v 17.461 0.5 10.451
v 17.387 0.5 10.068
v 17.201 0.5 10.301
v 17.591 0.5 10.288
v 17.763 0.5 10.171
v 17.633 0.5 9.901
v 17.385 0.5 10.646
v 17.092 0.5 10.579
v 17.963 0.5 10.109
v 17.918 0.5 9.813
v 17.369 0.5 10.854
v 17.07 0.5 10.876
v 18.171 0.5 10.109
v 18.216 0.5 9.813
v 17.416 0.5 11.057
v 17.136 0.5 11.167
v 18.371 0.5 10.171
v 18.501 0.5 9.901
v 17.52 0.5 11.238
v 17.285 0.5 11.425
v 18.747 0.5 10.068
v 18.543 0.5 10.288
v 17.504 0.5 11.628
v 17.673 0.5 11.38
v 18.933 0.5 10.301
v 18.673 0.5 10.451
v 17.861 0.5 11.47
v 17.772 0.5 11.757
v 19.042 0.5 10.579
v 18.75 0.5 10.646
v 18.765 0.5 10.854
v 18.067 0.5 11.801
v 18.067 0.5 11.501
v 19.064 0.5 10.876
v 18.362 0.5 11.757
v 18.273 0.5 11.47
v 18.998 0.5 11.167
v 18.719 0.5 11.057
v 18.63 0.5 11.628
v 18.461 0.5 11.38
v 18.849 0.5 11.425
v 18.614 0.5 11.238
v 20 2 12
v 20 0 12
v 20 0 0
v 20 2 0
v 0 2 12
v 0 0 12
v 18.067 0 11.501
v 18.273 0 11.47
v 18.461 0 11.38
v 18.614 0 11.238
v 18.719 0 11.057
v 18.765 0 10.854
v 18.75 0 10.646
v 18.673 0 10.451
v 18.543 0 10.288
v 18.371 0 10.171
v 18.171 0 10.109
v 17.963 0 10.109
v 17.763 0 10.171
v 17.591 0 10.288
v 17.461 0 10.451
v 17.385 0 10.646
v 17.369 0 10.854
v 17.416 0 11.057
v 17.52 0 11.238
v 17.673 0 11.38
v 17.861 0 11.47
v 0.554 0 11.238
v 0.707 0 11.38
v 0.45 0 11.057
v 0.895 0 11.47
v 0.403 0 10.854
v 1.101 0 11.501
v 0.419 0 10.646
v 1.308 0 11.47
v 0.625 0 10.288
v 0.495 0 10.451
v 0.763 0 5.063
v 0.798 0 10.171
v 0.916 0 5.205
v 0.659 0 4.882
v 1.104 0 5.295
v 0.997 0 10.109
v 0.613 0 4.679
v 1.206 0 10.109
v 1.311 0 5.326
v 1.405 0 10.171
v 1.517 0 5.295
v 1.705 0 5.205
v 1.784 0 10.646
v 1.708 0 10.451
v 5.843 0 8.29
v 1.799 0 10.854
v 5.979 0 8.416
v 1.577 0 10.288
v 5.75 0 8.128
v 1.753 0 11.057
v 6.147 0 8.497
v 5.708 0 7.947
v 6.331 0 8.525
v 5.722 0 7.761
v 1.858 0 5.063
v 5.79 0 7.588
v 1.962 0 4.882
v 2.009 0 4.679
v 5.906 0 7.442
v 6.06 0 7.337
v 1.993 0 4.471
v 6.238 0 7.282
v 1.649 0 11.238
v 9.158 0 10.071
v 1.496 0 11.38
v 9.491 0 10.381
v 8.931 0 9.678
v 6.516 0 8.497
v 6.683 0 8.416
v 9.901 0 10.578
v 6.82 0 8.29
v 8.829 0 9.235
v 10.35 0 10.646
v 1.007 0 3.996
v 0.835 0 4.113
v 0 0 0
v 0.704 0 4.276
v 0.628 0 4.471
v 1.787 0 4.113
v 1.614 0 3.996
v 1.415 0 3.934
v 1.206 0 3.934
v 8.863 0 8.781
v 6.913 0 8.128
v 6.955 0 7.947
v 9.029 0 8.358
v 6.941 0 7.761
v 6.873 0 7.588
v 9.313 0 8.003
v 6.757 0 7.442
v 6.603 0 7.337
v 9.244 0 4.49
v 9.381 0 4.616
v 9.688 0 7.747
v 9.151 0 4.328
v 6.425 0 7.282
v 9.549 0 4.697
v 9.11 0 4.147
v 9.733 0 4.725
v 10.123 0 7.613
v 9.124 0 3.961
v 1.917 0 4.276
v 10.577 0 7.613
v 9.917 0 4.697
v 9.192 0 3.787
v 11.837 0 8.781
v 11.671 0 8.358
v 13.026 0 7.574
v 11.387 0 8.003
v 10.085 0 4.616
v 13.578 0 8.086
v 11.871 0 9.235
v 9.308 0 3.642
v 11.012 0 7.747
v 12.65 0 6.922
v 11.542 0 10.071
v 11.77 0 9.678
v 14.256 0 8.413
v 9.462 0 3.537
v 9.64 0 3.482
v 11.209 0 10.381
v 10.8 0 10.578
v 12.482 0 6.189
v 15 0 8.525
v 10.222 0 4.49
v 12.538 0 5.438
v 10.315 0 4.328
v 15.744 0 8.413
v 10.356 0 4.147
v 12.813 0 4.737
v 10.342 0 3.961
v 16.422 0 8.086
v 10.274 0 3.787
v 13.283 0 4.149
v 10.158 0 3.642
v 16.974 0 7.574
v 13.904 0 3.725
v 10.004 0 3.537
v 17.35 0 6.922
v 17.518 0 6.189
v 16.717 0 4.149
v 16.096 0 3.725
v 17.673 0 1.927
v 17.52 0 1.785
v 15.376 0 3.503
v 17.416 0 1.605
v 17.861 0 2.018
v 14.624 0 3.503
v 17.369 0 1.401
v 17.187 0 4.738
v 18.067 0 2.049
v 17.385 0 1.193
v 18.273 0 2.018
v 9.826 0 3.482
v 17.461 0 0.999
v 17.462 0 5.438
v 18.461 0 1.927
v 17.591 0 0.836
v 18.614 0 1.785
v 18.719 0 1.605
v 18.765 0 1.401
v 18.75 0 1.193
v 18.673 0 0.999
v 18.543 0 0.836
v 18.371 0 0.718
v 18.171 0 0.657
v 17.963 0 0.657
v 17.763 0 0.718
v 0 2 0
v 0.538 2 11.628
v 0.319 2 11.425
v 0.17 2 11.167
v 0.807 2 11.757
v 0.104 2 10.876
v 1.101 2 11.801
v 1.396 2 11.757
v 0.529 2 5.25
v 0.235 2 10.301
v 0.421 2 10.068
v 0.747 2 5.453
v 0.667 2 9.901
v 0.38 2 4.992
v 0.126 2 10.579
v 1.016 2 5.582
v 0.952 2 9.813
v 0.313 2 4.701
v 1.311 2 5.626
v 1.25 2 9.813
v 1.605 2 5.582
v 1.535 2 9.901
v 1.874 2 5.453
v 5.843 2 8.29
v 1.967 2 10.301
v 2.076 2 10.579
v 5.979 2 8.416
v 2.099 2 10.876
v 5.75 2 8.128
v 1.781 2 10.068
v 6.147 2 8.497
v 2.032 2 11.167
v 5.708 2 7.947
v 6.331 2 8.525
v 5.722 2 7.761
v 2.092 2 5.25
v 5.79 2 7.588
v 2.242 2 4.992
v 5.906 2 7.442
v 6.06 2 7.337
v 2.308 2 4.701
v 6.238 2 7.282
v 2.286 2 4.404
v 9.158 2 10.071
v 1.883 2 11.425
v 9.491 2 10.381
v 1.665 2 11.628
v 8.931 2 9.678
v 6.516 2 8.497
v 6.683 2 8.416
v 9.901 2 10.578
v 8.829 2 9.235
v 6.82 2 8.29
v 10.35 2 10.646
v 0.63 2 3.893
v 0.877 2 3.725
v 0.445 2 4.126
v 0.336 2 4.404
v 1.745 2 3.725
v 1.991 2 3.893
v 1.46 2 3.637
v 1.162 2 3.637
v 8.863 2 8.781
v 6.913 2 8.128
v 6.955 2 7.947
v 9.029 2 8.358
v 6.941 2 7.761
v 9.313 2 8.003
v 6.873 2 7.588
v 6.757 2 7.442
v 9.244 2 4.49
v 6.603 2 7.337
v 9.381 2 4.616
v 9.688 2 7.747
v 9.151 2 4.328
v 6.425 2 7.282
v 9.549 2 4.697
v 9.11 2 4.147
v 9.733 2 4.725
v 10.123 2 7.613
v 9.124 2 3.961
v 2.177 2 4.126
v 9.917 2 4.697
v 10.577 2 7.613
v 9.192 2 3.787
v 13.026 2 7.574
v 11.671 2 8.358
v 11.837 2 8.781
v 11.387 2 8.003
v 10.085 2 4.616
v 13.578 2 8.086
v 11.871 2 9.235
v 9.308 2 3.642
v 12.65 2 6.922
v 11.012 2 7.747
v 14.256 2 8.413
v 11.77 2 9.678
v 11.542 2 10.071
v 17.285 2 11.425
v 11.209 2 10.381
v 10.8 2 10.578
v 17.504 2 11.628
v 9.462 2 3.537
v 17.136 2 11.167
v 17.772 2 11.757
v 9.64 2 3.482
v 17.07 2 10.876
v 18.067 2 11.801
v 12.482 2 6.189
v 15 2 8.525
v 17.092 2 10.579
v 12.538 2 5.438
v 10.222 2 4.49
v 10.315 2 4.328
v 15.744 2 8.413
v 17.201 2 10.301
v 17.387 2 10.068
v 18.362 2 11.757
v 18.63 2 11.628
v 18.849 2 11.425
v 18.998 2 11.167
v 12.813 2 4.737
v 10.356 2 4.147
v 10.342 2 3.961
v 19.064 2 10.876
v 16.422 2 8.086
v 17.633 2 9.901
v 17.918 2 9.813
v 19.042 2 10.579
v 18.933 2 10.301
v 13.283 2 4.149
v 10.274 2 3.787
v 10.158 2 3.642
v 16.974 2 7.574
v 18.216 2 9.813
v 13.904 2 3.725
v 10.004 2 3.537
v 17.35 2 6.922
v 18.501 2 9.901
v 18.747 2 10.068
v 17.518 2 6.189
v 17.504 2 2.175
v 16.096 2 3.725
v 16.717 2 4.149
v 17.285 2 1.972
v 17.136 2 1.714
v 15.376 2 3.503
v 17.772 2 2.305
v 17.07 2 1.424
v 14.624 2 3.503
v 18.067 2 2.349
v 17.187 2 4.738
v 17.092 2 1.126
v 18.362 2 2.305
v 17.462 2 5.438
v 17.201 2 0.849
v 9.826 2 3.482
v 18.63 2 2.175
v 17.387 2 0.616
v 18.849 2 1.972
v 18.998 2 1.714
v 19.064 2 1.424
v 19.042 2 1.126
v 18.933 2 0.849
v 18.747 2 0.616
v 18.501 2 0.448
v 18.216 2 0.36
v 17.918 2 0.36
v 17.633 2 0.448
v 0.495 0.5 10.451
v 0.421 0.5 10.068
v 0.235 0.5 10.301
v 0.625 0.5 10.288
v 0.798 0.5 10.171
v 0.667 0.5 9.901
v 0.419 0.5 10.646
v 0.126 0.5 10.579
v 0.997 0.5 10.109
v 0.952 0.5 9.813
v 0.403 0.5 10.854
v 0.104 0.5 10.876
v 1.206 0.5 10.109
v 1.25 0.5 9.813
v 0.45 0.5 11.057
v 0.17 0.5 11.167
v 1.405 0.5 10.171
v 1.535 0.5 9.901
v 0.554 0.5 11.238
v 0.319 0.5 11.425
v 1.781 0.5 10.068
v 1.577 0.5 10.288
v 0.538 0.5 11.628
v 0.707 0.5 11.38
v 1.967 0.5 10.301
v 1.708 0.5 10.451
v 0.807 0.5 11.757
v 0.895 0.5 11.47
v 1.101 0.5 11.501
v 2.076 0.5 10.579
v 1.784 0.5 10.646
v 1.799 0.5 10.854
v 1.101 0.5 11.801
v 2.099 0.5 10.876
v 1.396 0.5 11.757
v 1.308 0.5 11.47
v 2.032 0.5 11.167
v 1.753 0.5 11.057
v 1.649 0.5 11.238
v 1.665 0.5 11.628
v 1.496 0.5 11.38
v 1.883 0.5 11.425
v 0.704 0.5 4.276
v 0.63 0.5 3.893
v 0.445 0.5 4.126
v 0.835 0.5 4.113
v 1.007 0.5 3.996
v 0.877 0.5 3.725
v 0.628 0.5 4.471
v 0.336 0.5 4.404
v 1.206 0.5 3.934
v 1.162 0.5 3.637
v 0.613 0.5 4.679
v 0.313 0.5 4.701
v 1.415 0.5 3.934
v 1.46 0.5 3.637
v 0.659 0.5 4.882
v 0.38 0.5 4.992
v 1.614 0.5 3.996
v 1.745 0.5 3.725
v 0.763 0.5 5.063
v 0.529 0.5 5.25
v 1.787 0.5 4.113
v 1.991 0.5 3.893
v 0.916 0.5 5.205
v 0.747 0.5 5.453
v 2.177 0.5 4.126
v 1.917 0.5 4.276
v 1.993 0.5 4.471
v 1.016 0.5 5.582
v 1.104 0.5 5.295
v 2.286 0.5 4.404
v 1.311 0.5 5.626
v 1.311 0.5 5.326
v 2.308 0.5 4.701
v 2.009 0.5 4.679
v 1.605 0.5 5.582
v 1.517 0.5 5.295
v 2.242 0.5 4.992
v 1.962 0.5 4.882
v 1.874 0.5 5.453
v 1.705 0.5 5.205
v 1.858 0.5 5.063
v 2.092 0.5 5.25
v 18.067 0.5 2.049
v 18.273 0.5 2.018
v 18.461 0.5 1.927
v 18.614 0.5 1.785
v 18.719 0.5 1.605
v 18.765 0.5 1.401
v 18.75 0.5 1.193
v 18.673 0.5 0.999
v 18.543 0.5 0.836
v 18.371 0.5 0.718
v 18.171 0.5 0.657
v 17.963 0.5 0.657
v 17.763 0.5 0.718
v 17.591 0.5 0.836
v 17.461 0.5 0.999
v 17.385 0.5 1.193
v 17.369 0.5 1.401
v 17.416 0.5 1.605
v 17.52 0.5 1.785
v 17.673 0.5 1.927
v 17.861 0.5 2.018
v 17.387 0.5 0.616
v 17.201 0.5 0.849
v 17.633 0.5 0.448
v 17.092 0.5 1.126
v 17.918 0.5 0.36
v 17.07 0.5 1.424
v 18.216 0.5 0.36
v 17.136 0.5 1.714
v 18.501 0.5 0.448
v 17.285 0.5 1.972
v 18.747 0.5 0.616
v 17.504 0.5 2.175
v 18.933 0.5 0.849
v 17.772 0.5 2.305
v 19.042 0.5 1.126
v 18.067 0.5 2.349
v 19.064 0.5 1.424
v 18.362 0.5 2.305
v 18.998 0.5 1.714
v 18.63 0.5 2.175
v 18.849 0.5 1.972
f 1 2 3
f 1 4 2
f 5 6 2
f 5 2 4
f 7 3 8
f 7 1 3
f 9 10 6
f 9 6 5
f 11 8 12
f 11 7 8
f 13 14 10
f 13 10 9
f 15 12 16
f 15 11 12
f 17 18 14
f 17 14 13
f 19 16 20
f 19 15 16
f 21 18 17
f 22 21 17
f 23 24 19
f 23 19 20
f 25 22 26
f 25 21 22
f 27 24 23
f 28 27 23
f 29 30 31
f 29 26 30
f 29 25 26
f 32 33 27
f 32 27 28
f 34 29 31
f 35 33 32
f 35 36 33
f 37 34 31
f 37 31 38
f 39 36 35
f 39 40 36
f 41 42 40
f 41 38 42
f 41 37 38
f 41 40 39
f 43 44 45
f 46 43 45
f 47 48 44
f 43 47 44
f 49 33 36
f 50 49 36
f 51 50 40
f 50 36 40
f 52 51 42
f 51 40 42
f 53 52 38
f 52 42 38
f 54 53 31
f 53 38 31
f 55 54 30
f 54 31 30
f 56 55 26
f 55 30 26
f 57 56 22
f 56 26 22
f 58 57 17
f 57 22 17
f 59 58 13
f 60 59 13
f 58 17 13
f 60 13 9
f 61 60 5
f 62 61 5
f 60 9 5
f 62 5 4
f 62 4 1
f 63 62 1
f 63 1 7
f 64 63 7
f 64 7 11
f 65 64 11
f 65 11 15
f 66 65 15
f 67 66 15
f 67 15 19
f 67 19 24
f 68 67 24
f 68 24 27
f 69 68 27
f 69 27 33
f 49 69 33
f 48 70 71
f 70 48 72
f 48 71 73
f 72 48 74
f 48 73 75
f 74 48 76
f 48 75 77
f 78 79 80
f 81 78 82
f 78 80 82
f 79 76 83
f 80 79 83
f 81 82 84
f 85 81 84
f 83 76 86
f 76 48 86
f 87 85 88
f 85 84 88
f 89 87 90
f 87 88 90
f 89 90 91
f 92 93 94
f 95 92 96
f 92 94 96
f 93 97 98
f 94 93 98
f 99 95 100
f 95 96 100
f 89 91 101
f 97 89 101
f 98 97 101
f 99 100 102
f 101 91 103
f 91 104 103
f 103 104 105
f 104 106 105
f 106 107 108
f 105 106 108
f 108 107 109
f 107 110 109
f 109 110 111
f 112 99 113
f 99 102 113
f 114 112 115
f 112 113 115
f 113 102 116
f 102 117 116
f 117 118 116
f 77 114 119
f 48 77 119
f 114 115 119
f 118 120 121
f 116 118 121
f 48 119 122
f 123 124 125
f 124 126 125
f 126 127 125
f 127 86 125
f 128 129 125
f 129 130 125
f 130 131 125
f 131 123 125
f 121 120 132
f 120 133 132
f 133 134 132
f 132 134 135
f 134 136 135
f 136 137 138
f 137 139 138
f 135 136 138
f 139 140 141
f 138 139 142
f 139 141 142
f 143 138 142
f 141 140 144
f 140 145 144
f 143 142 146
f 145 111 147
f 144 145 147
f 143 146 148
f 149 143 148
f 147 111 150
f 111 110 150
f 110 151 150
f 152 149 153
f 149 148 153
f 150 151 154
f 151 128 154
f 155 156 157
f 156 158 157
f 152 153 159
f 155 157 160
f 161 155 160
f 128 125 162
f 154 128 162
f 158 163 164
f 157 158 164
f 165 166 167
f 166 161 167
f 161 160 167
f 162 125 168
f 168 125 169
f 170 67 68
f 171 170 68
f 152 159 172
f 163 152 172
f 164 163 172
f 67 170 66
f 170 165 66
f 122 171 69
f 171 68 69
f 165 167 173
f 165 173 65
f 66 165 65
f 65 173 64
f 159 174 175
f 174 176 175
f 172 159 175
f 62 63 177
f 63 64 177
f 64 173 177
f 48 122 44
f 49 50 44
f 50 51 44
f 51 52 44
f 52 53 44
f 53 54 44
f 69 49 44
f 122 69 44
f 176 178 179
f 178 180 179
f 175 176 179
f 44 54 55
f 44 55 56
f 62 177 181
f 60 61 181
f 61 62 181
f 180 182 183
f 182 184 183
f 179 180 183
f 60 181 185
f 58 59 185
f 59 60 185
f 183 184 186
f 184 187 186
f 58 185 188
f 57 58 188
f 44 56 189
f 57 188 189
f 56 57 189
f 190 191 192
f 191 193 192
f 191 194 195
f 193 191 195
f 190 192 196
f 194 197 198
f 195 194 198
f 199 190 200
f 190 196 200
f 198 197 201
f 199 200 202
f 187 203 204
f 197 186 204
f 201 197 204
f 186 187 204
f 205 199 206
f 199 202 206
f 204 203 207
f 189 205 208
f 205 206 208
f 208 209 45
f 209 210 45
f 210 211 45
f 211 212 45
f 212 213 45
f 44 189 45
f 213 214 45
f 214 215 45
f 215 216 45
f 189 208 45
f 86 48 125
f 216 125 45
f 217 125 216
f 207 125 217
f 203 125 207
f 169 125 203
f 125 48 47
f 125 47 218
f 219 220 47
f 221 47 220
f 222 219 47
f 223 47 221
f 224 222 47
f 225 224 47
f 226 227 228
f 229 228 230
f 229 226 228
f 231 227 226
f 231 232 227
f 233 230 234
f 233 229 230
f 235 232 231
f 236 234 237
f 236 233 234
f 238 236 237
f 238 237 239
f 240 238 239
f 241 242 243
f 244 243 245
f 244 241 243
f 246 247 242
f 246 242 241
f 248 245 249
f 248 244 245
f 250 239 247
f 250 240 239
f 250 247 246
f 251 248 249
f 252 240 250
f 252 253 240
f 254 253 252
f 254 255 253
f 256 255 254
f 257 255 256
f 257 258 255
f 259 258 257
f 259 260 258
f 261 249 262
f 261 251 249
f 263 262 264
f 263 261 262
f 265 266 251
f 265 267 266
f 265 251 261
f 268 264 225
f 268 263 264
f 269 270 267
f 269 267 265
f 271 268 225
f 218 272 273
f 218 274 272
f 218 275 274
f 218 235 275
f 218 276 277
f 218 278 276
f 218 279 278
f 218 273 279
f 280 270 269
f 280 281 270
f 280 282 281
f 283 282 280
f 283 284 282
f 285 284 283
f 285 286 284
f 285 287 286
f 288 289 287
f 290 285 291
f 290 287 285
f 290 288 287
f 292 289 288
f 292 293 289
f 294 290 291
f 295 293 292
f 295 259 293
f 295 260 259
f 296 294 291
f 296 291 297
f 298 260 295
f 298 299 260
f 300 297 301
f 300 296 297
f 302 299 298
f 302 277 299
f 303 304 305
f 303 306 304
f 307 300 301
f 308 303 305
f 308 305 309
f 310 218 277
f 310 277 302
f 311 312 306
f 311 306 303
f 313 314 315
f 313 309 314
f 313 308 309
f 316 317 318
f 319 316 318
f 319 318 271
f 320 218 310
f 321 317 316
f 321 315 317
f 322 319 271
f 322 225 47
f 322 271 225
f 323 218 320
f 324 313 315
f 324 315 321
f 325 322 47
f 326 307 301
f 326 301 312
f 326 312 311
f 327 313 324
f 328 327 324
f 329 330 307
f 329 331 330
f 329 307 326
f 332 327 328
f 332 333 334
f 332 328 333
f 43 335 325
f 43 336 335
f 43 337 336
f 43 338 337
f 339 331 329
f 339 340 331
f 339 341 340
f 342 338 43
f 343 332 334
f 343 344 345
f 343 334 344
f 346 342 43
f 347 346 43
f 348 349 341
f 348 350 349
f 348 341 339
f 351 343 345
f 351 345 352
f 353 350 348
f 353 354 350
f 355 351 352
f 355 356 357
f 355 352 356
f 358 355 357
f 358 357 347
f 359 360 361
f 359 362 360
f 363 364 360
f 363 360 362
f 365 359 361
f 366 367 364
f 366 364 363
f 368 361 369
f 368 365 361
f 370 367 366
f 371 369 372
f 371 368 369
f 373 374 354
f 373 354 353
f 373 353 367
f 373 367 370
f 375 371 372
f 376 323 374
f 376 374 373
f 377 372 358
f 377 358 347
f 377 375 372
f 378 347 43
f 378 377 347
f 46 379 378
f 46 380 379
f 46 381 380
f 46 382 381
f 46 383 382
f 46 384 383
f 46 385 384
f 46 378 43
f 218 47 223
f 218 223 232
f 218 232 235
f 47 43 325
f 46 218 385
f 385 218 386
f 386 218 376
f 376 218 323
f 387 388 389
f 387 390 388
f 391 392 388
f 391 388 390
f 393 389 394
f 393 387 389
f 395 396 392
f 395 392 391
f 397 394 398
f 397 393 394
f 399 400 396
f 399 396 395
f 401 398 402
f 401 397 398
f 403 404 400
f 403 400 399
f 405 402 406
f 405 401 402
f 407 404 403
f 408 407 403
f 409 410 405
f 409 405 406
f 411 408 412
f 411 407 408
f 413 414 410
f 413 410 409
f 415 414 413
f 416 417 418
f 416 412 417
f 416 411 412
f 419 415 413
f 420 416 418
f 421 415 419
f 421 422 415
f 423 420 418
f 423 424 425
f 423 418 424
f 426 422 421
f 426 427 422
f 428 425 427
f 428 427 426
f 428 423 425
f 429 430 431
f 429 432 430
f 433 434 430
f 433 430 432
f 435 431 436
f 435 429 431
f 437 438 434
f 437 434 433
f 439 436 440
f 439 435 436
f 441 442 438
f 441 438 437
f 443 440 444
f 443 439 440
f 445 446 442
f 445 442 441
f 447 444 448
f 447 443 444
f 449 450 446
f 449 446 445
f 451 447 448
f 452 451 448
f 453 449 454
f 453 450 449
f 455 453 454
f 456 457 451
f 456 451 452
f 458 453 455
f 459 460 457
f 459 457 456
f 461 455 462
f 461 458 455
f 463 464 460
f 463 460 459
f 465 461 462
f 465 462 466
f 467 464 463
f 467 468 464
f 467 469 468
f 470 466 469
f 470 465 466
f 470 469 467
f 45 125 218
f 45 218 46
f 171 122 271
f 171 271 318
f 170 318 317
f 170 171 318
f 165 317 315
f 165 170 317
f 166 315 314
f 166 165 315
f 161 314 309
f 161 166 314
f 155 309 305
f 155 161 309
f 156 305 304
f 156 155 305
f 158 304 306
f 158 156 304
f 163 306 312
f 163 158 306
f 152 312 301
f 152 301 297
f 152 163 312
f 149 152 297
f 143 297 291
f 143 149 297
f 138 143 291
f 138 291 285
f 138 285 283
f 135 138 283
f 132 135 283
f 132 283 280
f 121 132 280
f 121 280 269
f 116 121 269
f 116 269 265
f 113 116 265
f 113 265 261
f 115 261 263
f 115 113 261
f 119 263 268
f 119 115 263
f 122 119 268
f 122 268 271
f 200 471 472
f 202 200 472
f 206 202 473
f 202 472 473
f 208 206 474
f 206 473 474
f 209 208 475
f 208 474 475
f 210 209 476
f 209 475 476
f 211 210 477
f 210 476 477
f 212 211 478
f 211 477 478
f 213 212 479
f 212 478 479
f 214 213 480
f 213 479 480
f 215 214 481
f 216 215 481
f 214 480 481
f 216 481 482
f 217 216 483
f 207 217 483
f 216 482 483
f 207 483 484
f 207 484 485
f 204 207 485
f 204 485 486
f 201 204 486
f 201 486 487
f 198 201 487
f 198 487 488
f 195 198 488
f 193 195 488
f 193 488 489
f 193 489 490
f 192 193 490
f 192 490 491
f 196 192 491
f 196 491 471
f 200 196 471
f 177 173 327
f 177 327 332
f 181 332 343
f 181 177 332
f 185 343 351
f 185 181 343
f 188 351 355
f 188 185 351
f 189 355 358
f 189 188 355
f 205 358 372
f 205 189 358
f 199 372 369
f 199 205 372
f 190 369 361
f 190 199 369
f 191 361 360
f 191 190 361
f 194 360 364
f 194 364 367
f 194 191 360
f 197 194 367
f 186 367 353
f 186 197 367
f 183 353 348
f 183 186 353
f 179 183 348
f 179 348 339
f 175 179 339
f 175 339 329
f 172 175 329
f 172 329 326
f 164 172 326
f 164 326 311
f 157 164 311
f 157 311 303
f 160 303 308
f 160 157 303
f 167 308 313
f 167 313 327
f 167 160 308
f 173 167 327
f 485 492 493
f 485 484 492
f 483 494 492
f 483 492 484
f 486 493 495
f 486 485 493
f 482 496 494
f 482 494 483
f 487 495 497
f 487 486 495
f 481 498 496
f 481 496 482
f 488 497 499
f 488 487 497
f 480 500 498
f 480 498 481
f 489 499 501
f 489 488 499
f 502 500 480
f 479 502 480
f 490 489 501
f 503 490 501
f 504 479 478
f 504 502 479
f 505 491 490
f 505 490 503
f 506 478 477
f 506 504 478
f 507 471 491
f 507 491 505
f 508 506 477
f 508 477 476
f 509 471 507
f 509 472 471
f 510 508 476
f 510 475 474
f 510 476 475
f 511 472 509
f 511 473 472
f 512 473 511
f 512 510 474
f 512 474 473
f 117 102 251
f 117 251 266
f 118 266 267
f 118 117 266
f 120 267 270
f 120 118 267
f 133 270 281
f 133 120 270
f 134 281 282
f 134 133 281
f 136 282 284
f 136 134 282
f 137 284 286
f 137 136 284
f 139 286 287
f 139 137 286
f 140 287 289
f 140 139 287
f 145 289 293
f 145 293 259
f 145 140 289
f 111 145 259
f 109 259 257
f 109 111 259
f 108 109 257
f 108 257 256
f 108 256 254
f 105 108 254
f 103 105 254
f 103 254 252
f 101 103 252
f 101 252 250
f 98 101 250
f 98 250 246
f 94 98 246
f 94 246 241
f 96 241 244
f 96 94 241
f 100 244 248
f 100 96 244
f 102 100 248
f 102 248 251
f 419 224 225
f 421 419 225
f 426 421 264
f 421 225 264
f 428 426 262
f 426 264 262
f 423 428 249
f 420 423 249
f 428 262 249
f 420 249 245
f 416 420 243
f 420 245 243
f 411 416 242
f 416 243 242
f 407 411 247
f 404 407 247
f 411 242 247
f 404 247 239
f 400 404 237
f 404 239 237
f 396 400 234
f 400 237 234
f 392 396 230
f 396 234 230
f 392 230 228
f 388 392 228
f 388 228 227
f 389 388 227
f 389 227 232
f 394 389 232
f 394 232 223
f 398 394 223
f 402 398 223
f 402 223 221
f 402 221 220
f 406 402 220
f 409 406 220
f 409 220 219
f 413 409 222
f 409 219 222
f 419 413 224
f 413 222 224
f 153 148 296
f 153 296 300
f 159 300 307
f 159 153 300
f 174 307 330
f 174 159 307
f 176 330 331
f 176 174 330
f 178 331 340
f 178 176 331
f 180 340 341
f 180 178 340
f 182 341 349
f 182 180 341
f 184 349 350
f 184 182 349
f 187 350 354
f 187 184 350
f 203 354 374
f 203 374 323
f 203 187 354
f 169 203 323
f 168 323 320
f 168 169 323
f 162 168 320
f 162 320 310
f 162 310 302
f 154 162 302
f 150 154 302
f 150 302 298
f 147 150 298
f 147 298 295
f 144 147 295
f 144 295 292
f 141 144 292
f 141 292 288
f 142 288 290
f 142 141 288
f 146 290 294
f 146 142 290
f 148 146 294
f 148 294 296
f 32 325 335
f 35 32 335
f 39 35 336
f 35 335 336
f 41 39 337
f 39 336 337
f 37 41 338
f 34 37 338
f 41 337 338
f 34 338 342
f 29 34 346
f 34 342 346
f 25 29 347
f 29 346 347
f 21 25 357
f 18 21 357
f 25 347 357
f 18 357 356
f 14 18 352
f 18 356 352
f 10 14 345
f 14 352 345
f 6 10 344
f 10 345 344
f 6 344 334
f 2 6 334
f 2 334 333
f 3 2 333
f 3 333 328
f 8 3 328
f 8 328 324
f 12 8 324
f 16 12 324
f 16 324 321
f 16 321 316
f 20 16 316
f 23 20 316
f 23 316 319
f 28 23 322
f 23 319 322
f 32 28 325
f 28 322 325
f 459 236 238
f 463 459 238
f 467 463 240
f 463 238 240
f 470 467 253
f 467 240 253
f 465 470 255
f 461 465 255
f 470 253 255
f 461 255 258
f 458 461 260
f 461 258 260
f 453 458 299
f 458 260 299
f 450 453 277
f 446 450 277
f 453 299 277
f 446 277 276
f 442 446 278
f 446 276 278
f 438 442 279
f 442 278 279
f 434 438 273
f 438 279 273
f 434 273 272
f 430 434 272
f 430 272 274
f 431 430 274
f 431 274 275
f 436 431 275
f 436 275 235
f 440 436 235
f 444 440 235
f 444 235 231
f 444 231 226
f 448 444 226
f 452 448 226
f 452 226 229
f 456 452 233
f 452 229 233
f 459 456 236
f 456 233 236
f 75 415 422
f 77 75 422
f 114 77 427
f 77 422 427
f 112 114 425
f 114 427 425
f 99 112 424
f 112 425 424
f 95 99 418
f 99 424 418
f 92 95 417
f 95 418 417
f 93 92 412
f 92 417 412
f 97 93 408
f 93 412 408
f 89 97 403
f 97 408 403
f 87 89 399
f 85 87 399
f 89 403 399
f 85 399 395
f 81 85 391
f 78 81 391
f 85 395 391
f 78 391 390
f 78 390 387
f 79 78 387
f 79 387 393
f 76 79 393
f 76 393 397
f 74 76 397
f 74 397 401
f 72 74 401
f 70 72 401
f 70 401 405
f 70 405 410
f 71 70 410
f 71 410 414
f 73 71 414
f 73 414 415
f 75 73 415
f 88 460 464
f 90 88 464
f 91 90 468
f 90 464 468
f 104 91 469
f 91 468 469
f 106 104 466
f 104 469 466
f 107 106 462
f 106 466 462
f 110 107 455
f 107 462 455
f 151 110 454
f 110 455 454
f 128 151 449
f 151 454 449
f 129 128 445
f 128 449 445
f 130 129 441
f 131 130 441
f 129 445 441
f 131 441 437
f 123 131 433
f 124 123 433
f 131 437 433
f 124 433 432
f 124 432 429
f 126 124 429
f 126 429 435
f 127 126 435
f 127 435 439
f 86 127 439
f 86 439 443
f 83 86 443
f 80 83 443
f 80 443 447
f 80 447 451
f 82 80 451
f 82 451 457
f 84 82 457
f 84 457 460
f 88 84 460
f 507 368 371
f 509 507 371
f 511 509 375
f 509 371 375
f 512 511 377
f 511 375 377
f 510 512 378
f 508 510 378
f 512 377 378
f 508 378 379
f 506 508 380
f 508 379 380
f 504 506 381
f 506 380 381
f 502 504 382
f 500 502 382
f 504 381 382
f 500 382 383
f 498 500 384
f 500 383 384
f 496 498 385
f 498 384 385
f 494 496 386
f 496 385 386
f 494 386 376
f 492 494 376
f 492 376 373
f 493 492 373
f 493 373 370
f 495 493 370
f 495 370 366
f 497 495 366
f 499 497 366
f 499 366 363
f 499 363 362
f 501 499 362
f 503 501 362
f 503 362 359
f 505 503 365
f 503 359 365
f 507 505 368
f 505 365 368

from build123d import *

# Parameters (mm, degrees)
SKETCH_1_W          = 20
SKETCH_1_H          = 12
SKETCH_1_R          = 0.625
SKETCH_1_R_2        = 1.525
SKETCH_1_R_3        = 2.525
EXTRUDE_1_DEPTH     = 2
SKETCH_3_R          = 0.7
CUT_EXTRUDE_1_DEPTH = 24.409399821
SKETCH_3_3_R        = 1
CUT_EXTRUDE_2_DEPTH = 1.5


with BuildPart() as part:
    # 草图1 → 凸台-拉伸1 (new body)
    with BuildSketch(Plane(origin=(0, 0, 0), x_dir=(1, 0, 0), z_dir=(0, 1, 0))):
        with Locations((10, -6)):
            Rectangle(SKETCH_1_W, SKETCH_1_H)
        with Locations((9.732863826, -4.1)):
            Circle(SKETCH_1_R, mode=Mode.SUBTRACT)
        with Locations((10.350101922, -9.120648628)):
            Circle(SKETCH_1_R_2, mode=Mode.SUBTRACT)
        with Locations((6.331393556, -7.9)):
            Circle(SKETCH_1_R, mode=Mode.SUBTRACT)
        with Locations((15, -6)):
            Circle(SKETCH_1_R_3, mode=Mode.SUBTRACT)
    extrude(amount=EXTRUDE_1_DEPTH)

    # 草图3 → 切除-拉伸1 (cut, through all)
    with BuildSketch(Plane(origin=(0, 2, 0), x_dir=(1, 0, 0), z_dir=(0, 1, 0))):
        with Locations((1.101301337, -10.801482832)):
            Circle(SKETCH_3_R)
        with Locations((1.310630289, -4.626278754)):
            Circle(SKETCH_3_R)
        with Locations((18.067159924, -1.34892989)):
            Circle(SKETCH_3_R)
        with Locations((18.067159924, -10.801482832)):
            Circle(SKETCH_3_R)
    extrude(amount=-CUT_EXTRUDE_1_DEPTH, mode=Mode.SUBTRACT)

    # 草图3<3> → 切除-拉伸2 (cut)
    with BuildSketch(Plane(origin=(0, 2, 0), x_dir=(1, 0, 0), z_dir=(0, 1, 0))):
        with Locations((1.310630289, -4.626278754)):
            Circle(SKETCH_3_3_R)
        with Locations((1.101301337, -10.801482832)):
            Circle(SKETCH_3_3_R)
        with Locations((18.067159924, -1.34892989)):
            Circle(SKETCH_3_3_R)
        with Locations((18.067159924, -10.801482832)):
            Circle(SKETCH_3_3_R)
    extrude(amount=-CUT_EXTRUDE_2_DEPTH, mode=Mode.SUBTRACT)


solid = part.part
